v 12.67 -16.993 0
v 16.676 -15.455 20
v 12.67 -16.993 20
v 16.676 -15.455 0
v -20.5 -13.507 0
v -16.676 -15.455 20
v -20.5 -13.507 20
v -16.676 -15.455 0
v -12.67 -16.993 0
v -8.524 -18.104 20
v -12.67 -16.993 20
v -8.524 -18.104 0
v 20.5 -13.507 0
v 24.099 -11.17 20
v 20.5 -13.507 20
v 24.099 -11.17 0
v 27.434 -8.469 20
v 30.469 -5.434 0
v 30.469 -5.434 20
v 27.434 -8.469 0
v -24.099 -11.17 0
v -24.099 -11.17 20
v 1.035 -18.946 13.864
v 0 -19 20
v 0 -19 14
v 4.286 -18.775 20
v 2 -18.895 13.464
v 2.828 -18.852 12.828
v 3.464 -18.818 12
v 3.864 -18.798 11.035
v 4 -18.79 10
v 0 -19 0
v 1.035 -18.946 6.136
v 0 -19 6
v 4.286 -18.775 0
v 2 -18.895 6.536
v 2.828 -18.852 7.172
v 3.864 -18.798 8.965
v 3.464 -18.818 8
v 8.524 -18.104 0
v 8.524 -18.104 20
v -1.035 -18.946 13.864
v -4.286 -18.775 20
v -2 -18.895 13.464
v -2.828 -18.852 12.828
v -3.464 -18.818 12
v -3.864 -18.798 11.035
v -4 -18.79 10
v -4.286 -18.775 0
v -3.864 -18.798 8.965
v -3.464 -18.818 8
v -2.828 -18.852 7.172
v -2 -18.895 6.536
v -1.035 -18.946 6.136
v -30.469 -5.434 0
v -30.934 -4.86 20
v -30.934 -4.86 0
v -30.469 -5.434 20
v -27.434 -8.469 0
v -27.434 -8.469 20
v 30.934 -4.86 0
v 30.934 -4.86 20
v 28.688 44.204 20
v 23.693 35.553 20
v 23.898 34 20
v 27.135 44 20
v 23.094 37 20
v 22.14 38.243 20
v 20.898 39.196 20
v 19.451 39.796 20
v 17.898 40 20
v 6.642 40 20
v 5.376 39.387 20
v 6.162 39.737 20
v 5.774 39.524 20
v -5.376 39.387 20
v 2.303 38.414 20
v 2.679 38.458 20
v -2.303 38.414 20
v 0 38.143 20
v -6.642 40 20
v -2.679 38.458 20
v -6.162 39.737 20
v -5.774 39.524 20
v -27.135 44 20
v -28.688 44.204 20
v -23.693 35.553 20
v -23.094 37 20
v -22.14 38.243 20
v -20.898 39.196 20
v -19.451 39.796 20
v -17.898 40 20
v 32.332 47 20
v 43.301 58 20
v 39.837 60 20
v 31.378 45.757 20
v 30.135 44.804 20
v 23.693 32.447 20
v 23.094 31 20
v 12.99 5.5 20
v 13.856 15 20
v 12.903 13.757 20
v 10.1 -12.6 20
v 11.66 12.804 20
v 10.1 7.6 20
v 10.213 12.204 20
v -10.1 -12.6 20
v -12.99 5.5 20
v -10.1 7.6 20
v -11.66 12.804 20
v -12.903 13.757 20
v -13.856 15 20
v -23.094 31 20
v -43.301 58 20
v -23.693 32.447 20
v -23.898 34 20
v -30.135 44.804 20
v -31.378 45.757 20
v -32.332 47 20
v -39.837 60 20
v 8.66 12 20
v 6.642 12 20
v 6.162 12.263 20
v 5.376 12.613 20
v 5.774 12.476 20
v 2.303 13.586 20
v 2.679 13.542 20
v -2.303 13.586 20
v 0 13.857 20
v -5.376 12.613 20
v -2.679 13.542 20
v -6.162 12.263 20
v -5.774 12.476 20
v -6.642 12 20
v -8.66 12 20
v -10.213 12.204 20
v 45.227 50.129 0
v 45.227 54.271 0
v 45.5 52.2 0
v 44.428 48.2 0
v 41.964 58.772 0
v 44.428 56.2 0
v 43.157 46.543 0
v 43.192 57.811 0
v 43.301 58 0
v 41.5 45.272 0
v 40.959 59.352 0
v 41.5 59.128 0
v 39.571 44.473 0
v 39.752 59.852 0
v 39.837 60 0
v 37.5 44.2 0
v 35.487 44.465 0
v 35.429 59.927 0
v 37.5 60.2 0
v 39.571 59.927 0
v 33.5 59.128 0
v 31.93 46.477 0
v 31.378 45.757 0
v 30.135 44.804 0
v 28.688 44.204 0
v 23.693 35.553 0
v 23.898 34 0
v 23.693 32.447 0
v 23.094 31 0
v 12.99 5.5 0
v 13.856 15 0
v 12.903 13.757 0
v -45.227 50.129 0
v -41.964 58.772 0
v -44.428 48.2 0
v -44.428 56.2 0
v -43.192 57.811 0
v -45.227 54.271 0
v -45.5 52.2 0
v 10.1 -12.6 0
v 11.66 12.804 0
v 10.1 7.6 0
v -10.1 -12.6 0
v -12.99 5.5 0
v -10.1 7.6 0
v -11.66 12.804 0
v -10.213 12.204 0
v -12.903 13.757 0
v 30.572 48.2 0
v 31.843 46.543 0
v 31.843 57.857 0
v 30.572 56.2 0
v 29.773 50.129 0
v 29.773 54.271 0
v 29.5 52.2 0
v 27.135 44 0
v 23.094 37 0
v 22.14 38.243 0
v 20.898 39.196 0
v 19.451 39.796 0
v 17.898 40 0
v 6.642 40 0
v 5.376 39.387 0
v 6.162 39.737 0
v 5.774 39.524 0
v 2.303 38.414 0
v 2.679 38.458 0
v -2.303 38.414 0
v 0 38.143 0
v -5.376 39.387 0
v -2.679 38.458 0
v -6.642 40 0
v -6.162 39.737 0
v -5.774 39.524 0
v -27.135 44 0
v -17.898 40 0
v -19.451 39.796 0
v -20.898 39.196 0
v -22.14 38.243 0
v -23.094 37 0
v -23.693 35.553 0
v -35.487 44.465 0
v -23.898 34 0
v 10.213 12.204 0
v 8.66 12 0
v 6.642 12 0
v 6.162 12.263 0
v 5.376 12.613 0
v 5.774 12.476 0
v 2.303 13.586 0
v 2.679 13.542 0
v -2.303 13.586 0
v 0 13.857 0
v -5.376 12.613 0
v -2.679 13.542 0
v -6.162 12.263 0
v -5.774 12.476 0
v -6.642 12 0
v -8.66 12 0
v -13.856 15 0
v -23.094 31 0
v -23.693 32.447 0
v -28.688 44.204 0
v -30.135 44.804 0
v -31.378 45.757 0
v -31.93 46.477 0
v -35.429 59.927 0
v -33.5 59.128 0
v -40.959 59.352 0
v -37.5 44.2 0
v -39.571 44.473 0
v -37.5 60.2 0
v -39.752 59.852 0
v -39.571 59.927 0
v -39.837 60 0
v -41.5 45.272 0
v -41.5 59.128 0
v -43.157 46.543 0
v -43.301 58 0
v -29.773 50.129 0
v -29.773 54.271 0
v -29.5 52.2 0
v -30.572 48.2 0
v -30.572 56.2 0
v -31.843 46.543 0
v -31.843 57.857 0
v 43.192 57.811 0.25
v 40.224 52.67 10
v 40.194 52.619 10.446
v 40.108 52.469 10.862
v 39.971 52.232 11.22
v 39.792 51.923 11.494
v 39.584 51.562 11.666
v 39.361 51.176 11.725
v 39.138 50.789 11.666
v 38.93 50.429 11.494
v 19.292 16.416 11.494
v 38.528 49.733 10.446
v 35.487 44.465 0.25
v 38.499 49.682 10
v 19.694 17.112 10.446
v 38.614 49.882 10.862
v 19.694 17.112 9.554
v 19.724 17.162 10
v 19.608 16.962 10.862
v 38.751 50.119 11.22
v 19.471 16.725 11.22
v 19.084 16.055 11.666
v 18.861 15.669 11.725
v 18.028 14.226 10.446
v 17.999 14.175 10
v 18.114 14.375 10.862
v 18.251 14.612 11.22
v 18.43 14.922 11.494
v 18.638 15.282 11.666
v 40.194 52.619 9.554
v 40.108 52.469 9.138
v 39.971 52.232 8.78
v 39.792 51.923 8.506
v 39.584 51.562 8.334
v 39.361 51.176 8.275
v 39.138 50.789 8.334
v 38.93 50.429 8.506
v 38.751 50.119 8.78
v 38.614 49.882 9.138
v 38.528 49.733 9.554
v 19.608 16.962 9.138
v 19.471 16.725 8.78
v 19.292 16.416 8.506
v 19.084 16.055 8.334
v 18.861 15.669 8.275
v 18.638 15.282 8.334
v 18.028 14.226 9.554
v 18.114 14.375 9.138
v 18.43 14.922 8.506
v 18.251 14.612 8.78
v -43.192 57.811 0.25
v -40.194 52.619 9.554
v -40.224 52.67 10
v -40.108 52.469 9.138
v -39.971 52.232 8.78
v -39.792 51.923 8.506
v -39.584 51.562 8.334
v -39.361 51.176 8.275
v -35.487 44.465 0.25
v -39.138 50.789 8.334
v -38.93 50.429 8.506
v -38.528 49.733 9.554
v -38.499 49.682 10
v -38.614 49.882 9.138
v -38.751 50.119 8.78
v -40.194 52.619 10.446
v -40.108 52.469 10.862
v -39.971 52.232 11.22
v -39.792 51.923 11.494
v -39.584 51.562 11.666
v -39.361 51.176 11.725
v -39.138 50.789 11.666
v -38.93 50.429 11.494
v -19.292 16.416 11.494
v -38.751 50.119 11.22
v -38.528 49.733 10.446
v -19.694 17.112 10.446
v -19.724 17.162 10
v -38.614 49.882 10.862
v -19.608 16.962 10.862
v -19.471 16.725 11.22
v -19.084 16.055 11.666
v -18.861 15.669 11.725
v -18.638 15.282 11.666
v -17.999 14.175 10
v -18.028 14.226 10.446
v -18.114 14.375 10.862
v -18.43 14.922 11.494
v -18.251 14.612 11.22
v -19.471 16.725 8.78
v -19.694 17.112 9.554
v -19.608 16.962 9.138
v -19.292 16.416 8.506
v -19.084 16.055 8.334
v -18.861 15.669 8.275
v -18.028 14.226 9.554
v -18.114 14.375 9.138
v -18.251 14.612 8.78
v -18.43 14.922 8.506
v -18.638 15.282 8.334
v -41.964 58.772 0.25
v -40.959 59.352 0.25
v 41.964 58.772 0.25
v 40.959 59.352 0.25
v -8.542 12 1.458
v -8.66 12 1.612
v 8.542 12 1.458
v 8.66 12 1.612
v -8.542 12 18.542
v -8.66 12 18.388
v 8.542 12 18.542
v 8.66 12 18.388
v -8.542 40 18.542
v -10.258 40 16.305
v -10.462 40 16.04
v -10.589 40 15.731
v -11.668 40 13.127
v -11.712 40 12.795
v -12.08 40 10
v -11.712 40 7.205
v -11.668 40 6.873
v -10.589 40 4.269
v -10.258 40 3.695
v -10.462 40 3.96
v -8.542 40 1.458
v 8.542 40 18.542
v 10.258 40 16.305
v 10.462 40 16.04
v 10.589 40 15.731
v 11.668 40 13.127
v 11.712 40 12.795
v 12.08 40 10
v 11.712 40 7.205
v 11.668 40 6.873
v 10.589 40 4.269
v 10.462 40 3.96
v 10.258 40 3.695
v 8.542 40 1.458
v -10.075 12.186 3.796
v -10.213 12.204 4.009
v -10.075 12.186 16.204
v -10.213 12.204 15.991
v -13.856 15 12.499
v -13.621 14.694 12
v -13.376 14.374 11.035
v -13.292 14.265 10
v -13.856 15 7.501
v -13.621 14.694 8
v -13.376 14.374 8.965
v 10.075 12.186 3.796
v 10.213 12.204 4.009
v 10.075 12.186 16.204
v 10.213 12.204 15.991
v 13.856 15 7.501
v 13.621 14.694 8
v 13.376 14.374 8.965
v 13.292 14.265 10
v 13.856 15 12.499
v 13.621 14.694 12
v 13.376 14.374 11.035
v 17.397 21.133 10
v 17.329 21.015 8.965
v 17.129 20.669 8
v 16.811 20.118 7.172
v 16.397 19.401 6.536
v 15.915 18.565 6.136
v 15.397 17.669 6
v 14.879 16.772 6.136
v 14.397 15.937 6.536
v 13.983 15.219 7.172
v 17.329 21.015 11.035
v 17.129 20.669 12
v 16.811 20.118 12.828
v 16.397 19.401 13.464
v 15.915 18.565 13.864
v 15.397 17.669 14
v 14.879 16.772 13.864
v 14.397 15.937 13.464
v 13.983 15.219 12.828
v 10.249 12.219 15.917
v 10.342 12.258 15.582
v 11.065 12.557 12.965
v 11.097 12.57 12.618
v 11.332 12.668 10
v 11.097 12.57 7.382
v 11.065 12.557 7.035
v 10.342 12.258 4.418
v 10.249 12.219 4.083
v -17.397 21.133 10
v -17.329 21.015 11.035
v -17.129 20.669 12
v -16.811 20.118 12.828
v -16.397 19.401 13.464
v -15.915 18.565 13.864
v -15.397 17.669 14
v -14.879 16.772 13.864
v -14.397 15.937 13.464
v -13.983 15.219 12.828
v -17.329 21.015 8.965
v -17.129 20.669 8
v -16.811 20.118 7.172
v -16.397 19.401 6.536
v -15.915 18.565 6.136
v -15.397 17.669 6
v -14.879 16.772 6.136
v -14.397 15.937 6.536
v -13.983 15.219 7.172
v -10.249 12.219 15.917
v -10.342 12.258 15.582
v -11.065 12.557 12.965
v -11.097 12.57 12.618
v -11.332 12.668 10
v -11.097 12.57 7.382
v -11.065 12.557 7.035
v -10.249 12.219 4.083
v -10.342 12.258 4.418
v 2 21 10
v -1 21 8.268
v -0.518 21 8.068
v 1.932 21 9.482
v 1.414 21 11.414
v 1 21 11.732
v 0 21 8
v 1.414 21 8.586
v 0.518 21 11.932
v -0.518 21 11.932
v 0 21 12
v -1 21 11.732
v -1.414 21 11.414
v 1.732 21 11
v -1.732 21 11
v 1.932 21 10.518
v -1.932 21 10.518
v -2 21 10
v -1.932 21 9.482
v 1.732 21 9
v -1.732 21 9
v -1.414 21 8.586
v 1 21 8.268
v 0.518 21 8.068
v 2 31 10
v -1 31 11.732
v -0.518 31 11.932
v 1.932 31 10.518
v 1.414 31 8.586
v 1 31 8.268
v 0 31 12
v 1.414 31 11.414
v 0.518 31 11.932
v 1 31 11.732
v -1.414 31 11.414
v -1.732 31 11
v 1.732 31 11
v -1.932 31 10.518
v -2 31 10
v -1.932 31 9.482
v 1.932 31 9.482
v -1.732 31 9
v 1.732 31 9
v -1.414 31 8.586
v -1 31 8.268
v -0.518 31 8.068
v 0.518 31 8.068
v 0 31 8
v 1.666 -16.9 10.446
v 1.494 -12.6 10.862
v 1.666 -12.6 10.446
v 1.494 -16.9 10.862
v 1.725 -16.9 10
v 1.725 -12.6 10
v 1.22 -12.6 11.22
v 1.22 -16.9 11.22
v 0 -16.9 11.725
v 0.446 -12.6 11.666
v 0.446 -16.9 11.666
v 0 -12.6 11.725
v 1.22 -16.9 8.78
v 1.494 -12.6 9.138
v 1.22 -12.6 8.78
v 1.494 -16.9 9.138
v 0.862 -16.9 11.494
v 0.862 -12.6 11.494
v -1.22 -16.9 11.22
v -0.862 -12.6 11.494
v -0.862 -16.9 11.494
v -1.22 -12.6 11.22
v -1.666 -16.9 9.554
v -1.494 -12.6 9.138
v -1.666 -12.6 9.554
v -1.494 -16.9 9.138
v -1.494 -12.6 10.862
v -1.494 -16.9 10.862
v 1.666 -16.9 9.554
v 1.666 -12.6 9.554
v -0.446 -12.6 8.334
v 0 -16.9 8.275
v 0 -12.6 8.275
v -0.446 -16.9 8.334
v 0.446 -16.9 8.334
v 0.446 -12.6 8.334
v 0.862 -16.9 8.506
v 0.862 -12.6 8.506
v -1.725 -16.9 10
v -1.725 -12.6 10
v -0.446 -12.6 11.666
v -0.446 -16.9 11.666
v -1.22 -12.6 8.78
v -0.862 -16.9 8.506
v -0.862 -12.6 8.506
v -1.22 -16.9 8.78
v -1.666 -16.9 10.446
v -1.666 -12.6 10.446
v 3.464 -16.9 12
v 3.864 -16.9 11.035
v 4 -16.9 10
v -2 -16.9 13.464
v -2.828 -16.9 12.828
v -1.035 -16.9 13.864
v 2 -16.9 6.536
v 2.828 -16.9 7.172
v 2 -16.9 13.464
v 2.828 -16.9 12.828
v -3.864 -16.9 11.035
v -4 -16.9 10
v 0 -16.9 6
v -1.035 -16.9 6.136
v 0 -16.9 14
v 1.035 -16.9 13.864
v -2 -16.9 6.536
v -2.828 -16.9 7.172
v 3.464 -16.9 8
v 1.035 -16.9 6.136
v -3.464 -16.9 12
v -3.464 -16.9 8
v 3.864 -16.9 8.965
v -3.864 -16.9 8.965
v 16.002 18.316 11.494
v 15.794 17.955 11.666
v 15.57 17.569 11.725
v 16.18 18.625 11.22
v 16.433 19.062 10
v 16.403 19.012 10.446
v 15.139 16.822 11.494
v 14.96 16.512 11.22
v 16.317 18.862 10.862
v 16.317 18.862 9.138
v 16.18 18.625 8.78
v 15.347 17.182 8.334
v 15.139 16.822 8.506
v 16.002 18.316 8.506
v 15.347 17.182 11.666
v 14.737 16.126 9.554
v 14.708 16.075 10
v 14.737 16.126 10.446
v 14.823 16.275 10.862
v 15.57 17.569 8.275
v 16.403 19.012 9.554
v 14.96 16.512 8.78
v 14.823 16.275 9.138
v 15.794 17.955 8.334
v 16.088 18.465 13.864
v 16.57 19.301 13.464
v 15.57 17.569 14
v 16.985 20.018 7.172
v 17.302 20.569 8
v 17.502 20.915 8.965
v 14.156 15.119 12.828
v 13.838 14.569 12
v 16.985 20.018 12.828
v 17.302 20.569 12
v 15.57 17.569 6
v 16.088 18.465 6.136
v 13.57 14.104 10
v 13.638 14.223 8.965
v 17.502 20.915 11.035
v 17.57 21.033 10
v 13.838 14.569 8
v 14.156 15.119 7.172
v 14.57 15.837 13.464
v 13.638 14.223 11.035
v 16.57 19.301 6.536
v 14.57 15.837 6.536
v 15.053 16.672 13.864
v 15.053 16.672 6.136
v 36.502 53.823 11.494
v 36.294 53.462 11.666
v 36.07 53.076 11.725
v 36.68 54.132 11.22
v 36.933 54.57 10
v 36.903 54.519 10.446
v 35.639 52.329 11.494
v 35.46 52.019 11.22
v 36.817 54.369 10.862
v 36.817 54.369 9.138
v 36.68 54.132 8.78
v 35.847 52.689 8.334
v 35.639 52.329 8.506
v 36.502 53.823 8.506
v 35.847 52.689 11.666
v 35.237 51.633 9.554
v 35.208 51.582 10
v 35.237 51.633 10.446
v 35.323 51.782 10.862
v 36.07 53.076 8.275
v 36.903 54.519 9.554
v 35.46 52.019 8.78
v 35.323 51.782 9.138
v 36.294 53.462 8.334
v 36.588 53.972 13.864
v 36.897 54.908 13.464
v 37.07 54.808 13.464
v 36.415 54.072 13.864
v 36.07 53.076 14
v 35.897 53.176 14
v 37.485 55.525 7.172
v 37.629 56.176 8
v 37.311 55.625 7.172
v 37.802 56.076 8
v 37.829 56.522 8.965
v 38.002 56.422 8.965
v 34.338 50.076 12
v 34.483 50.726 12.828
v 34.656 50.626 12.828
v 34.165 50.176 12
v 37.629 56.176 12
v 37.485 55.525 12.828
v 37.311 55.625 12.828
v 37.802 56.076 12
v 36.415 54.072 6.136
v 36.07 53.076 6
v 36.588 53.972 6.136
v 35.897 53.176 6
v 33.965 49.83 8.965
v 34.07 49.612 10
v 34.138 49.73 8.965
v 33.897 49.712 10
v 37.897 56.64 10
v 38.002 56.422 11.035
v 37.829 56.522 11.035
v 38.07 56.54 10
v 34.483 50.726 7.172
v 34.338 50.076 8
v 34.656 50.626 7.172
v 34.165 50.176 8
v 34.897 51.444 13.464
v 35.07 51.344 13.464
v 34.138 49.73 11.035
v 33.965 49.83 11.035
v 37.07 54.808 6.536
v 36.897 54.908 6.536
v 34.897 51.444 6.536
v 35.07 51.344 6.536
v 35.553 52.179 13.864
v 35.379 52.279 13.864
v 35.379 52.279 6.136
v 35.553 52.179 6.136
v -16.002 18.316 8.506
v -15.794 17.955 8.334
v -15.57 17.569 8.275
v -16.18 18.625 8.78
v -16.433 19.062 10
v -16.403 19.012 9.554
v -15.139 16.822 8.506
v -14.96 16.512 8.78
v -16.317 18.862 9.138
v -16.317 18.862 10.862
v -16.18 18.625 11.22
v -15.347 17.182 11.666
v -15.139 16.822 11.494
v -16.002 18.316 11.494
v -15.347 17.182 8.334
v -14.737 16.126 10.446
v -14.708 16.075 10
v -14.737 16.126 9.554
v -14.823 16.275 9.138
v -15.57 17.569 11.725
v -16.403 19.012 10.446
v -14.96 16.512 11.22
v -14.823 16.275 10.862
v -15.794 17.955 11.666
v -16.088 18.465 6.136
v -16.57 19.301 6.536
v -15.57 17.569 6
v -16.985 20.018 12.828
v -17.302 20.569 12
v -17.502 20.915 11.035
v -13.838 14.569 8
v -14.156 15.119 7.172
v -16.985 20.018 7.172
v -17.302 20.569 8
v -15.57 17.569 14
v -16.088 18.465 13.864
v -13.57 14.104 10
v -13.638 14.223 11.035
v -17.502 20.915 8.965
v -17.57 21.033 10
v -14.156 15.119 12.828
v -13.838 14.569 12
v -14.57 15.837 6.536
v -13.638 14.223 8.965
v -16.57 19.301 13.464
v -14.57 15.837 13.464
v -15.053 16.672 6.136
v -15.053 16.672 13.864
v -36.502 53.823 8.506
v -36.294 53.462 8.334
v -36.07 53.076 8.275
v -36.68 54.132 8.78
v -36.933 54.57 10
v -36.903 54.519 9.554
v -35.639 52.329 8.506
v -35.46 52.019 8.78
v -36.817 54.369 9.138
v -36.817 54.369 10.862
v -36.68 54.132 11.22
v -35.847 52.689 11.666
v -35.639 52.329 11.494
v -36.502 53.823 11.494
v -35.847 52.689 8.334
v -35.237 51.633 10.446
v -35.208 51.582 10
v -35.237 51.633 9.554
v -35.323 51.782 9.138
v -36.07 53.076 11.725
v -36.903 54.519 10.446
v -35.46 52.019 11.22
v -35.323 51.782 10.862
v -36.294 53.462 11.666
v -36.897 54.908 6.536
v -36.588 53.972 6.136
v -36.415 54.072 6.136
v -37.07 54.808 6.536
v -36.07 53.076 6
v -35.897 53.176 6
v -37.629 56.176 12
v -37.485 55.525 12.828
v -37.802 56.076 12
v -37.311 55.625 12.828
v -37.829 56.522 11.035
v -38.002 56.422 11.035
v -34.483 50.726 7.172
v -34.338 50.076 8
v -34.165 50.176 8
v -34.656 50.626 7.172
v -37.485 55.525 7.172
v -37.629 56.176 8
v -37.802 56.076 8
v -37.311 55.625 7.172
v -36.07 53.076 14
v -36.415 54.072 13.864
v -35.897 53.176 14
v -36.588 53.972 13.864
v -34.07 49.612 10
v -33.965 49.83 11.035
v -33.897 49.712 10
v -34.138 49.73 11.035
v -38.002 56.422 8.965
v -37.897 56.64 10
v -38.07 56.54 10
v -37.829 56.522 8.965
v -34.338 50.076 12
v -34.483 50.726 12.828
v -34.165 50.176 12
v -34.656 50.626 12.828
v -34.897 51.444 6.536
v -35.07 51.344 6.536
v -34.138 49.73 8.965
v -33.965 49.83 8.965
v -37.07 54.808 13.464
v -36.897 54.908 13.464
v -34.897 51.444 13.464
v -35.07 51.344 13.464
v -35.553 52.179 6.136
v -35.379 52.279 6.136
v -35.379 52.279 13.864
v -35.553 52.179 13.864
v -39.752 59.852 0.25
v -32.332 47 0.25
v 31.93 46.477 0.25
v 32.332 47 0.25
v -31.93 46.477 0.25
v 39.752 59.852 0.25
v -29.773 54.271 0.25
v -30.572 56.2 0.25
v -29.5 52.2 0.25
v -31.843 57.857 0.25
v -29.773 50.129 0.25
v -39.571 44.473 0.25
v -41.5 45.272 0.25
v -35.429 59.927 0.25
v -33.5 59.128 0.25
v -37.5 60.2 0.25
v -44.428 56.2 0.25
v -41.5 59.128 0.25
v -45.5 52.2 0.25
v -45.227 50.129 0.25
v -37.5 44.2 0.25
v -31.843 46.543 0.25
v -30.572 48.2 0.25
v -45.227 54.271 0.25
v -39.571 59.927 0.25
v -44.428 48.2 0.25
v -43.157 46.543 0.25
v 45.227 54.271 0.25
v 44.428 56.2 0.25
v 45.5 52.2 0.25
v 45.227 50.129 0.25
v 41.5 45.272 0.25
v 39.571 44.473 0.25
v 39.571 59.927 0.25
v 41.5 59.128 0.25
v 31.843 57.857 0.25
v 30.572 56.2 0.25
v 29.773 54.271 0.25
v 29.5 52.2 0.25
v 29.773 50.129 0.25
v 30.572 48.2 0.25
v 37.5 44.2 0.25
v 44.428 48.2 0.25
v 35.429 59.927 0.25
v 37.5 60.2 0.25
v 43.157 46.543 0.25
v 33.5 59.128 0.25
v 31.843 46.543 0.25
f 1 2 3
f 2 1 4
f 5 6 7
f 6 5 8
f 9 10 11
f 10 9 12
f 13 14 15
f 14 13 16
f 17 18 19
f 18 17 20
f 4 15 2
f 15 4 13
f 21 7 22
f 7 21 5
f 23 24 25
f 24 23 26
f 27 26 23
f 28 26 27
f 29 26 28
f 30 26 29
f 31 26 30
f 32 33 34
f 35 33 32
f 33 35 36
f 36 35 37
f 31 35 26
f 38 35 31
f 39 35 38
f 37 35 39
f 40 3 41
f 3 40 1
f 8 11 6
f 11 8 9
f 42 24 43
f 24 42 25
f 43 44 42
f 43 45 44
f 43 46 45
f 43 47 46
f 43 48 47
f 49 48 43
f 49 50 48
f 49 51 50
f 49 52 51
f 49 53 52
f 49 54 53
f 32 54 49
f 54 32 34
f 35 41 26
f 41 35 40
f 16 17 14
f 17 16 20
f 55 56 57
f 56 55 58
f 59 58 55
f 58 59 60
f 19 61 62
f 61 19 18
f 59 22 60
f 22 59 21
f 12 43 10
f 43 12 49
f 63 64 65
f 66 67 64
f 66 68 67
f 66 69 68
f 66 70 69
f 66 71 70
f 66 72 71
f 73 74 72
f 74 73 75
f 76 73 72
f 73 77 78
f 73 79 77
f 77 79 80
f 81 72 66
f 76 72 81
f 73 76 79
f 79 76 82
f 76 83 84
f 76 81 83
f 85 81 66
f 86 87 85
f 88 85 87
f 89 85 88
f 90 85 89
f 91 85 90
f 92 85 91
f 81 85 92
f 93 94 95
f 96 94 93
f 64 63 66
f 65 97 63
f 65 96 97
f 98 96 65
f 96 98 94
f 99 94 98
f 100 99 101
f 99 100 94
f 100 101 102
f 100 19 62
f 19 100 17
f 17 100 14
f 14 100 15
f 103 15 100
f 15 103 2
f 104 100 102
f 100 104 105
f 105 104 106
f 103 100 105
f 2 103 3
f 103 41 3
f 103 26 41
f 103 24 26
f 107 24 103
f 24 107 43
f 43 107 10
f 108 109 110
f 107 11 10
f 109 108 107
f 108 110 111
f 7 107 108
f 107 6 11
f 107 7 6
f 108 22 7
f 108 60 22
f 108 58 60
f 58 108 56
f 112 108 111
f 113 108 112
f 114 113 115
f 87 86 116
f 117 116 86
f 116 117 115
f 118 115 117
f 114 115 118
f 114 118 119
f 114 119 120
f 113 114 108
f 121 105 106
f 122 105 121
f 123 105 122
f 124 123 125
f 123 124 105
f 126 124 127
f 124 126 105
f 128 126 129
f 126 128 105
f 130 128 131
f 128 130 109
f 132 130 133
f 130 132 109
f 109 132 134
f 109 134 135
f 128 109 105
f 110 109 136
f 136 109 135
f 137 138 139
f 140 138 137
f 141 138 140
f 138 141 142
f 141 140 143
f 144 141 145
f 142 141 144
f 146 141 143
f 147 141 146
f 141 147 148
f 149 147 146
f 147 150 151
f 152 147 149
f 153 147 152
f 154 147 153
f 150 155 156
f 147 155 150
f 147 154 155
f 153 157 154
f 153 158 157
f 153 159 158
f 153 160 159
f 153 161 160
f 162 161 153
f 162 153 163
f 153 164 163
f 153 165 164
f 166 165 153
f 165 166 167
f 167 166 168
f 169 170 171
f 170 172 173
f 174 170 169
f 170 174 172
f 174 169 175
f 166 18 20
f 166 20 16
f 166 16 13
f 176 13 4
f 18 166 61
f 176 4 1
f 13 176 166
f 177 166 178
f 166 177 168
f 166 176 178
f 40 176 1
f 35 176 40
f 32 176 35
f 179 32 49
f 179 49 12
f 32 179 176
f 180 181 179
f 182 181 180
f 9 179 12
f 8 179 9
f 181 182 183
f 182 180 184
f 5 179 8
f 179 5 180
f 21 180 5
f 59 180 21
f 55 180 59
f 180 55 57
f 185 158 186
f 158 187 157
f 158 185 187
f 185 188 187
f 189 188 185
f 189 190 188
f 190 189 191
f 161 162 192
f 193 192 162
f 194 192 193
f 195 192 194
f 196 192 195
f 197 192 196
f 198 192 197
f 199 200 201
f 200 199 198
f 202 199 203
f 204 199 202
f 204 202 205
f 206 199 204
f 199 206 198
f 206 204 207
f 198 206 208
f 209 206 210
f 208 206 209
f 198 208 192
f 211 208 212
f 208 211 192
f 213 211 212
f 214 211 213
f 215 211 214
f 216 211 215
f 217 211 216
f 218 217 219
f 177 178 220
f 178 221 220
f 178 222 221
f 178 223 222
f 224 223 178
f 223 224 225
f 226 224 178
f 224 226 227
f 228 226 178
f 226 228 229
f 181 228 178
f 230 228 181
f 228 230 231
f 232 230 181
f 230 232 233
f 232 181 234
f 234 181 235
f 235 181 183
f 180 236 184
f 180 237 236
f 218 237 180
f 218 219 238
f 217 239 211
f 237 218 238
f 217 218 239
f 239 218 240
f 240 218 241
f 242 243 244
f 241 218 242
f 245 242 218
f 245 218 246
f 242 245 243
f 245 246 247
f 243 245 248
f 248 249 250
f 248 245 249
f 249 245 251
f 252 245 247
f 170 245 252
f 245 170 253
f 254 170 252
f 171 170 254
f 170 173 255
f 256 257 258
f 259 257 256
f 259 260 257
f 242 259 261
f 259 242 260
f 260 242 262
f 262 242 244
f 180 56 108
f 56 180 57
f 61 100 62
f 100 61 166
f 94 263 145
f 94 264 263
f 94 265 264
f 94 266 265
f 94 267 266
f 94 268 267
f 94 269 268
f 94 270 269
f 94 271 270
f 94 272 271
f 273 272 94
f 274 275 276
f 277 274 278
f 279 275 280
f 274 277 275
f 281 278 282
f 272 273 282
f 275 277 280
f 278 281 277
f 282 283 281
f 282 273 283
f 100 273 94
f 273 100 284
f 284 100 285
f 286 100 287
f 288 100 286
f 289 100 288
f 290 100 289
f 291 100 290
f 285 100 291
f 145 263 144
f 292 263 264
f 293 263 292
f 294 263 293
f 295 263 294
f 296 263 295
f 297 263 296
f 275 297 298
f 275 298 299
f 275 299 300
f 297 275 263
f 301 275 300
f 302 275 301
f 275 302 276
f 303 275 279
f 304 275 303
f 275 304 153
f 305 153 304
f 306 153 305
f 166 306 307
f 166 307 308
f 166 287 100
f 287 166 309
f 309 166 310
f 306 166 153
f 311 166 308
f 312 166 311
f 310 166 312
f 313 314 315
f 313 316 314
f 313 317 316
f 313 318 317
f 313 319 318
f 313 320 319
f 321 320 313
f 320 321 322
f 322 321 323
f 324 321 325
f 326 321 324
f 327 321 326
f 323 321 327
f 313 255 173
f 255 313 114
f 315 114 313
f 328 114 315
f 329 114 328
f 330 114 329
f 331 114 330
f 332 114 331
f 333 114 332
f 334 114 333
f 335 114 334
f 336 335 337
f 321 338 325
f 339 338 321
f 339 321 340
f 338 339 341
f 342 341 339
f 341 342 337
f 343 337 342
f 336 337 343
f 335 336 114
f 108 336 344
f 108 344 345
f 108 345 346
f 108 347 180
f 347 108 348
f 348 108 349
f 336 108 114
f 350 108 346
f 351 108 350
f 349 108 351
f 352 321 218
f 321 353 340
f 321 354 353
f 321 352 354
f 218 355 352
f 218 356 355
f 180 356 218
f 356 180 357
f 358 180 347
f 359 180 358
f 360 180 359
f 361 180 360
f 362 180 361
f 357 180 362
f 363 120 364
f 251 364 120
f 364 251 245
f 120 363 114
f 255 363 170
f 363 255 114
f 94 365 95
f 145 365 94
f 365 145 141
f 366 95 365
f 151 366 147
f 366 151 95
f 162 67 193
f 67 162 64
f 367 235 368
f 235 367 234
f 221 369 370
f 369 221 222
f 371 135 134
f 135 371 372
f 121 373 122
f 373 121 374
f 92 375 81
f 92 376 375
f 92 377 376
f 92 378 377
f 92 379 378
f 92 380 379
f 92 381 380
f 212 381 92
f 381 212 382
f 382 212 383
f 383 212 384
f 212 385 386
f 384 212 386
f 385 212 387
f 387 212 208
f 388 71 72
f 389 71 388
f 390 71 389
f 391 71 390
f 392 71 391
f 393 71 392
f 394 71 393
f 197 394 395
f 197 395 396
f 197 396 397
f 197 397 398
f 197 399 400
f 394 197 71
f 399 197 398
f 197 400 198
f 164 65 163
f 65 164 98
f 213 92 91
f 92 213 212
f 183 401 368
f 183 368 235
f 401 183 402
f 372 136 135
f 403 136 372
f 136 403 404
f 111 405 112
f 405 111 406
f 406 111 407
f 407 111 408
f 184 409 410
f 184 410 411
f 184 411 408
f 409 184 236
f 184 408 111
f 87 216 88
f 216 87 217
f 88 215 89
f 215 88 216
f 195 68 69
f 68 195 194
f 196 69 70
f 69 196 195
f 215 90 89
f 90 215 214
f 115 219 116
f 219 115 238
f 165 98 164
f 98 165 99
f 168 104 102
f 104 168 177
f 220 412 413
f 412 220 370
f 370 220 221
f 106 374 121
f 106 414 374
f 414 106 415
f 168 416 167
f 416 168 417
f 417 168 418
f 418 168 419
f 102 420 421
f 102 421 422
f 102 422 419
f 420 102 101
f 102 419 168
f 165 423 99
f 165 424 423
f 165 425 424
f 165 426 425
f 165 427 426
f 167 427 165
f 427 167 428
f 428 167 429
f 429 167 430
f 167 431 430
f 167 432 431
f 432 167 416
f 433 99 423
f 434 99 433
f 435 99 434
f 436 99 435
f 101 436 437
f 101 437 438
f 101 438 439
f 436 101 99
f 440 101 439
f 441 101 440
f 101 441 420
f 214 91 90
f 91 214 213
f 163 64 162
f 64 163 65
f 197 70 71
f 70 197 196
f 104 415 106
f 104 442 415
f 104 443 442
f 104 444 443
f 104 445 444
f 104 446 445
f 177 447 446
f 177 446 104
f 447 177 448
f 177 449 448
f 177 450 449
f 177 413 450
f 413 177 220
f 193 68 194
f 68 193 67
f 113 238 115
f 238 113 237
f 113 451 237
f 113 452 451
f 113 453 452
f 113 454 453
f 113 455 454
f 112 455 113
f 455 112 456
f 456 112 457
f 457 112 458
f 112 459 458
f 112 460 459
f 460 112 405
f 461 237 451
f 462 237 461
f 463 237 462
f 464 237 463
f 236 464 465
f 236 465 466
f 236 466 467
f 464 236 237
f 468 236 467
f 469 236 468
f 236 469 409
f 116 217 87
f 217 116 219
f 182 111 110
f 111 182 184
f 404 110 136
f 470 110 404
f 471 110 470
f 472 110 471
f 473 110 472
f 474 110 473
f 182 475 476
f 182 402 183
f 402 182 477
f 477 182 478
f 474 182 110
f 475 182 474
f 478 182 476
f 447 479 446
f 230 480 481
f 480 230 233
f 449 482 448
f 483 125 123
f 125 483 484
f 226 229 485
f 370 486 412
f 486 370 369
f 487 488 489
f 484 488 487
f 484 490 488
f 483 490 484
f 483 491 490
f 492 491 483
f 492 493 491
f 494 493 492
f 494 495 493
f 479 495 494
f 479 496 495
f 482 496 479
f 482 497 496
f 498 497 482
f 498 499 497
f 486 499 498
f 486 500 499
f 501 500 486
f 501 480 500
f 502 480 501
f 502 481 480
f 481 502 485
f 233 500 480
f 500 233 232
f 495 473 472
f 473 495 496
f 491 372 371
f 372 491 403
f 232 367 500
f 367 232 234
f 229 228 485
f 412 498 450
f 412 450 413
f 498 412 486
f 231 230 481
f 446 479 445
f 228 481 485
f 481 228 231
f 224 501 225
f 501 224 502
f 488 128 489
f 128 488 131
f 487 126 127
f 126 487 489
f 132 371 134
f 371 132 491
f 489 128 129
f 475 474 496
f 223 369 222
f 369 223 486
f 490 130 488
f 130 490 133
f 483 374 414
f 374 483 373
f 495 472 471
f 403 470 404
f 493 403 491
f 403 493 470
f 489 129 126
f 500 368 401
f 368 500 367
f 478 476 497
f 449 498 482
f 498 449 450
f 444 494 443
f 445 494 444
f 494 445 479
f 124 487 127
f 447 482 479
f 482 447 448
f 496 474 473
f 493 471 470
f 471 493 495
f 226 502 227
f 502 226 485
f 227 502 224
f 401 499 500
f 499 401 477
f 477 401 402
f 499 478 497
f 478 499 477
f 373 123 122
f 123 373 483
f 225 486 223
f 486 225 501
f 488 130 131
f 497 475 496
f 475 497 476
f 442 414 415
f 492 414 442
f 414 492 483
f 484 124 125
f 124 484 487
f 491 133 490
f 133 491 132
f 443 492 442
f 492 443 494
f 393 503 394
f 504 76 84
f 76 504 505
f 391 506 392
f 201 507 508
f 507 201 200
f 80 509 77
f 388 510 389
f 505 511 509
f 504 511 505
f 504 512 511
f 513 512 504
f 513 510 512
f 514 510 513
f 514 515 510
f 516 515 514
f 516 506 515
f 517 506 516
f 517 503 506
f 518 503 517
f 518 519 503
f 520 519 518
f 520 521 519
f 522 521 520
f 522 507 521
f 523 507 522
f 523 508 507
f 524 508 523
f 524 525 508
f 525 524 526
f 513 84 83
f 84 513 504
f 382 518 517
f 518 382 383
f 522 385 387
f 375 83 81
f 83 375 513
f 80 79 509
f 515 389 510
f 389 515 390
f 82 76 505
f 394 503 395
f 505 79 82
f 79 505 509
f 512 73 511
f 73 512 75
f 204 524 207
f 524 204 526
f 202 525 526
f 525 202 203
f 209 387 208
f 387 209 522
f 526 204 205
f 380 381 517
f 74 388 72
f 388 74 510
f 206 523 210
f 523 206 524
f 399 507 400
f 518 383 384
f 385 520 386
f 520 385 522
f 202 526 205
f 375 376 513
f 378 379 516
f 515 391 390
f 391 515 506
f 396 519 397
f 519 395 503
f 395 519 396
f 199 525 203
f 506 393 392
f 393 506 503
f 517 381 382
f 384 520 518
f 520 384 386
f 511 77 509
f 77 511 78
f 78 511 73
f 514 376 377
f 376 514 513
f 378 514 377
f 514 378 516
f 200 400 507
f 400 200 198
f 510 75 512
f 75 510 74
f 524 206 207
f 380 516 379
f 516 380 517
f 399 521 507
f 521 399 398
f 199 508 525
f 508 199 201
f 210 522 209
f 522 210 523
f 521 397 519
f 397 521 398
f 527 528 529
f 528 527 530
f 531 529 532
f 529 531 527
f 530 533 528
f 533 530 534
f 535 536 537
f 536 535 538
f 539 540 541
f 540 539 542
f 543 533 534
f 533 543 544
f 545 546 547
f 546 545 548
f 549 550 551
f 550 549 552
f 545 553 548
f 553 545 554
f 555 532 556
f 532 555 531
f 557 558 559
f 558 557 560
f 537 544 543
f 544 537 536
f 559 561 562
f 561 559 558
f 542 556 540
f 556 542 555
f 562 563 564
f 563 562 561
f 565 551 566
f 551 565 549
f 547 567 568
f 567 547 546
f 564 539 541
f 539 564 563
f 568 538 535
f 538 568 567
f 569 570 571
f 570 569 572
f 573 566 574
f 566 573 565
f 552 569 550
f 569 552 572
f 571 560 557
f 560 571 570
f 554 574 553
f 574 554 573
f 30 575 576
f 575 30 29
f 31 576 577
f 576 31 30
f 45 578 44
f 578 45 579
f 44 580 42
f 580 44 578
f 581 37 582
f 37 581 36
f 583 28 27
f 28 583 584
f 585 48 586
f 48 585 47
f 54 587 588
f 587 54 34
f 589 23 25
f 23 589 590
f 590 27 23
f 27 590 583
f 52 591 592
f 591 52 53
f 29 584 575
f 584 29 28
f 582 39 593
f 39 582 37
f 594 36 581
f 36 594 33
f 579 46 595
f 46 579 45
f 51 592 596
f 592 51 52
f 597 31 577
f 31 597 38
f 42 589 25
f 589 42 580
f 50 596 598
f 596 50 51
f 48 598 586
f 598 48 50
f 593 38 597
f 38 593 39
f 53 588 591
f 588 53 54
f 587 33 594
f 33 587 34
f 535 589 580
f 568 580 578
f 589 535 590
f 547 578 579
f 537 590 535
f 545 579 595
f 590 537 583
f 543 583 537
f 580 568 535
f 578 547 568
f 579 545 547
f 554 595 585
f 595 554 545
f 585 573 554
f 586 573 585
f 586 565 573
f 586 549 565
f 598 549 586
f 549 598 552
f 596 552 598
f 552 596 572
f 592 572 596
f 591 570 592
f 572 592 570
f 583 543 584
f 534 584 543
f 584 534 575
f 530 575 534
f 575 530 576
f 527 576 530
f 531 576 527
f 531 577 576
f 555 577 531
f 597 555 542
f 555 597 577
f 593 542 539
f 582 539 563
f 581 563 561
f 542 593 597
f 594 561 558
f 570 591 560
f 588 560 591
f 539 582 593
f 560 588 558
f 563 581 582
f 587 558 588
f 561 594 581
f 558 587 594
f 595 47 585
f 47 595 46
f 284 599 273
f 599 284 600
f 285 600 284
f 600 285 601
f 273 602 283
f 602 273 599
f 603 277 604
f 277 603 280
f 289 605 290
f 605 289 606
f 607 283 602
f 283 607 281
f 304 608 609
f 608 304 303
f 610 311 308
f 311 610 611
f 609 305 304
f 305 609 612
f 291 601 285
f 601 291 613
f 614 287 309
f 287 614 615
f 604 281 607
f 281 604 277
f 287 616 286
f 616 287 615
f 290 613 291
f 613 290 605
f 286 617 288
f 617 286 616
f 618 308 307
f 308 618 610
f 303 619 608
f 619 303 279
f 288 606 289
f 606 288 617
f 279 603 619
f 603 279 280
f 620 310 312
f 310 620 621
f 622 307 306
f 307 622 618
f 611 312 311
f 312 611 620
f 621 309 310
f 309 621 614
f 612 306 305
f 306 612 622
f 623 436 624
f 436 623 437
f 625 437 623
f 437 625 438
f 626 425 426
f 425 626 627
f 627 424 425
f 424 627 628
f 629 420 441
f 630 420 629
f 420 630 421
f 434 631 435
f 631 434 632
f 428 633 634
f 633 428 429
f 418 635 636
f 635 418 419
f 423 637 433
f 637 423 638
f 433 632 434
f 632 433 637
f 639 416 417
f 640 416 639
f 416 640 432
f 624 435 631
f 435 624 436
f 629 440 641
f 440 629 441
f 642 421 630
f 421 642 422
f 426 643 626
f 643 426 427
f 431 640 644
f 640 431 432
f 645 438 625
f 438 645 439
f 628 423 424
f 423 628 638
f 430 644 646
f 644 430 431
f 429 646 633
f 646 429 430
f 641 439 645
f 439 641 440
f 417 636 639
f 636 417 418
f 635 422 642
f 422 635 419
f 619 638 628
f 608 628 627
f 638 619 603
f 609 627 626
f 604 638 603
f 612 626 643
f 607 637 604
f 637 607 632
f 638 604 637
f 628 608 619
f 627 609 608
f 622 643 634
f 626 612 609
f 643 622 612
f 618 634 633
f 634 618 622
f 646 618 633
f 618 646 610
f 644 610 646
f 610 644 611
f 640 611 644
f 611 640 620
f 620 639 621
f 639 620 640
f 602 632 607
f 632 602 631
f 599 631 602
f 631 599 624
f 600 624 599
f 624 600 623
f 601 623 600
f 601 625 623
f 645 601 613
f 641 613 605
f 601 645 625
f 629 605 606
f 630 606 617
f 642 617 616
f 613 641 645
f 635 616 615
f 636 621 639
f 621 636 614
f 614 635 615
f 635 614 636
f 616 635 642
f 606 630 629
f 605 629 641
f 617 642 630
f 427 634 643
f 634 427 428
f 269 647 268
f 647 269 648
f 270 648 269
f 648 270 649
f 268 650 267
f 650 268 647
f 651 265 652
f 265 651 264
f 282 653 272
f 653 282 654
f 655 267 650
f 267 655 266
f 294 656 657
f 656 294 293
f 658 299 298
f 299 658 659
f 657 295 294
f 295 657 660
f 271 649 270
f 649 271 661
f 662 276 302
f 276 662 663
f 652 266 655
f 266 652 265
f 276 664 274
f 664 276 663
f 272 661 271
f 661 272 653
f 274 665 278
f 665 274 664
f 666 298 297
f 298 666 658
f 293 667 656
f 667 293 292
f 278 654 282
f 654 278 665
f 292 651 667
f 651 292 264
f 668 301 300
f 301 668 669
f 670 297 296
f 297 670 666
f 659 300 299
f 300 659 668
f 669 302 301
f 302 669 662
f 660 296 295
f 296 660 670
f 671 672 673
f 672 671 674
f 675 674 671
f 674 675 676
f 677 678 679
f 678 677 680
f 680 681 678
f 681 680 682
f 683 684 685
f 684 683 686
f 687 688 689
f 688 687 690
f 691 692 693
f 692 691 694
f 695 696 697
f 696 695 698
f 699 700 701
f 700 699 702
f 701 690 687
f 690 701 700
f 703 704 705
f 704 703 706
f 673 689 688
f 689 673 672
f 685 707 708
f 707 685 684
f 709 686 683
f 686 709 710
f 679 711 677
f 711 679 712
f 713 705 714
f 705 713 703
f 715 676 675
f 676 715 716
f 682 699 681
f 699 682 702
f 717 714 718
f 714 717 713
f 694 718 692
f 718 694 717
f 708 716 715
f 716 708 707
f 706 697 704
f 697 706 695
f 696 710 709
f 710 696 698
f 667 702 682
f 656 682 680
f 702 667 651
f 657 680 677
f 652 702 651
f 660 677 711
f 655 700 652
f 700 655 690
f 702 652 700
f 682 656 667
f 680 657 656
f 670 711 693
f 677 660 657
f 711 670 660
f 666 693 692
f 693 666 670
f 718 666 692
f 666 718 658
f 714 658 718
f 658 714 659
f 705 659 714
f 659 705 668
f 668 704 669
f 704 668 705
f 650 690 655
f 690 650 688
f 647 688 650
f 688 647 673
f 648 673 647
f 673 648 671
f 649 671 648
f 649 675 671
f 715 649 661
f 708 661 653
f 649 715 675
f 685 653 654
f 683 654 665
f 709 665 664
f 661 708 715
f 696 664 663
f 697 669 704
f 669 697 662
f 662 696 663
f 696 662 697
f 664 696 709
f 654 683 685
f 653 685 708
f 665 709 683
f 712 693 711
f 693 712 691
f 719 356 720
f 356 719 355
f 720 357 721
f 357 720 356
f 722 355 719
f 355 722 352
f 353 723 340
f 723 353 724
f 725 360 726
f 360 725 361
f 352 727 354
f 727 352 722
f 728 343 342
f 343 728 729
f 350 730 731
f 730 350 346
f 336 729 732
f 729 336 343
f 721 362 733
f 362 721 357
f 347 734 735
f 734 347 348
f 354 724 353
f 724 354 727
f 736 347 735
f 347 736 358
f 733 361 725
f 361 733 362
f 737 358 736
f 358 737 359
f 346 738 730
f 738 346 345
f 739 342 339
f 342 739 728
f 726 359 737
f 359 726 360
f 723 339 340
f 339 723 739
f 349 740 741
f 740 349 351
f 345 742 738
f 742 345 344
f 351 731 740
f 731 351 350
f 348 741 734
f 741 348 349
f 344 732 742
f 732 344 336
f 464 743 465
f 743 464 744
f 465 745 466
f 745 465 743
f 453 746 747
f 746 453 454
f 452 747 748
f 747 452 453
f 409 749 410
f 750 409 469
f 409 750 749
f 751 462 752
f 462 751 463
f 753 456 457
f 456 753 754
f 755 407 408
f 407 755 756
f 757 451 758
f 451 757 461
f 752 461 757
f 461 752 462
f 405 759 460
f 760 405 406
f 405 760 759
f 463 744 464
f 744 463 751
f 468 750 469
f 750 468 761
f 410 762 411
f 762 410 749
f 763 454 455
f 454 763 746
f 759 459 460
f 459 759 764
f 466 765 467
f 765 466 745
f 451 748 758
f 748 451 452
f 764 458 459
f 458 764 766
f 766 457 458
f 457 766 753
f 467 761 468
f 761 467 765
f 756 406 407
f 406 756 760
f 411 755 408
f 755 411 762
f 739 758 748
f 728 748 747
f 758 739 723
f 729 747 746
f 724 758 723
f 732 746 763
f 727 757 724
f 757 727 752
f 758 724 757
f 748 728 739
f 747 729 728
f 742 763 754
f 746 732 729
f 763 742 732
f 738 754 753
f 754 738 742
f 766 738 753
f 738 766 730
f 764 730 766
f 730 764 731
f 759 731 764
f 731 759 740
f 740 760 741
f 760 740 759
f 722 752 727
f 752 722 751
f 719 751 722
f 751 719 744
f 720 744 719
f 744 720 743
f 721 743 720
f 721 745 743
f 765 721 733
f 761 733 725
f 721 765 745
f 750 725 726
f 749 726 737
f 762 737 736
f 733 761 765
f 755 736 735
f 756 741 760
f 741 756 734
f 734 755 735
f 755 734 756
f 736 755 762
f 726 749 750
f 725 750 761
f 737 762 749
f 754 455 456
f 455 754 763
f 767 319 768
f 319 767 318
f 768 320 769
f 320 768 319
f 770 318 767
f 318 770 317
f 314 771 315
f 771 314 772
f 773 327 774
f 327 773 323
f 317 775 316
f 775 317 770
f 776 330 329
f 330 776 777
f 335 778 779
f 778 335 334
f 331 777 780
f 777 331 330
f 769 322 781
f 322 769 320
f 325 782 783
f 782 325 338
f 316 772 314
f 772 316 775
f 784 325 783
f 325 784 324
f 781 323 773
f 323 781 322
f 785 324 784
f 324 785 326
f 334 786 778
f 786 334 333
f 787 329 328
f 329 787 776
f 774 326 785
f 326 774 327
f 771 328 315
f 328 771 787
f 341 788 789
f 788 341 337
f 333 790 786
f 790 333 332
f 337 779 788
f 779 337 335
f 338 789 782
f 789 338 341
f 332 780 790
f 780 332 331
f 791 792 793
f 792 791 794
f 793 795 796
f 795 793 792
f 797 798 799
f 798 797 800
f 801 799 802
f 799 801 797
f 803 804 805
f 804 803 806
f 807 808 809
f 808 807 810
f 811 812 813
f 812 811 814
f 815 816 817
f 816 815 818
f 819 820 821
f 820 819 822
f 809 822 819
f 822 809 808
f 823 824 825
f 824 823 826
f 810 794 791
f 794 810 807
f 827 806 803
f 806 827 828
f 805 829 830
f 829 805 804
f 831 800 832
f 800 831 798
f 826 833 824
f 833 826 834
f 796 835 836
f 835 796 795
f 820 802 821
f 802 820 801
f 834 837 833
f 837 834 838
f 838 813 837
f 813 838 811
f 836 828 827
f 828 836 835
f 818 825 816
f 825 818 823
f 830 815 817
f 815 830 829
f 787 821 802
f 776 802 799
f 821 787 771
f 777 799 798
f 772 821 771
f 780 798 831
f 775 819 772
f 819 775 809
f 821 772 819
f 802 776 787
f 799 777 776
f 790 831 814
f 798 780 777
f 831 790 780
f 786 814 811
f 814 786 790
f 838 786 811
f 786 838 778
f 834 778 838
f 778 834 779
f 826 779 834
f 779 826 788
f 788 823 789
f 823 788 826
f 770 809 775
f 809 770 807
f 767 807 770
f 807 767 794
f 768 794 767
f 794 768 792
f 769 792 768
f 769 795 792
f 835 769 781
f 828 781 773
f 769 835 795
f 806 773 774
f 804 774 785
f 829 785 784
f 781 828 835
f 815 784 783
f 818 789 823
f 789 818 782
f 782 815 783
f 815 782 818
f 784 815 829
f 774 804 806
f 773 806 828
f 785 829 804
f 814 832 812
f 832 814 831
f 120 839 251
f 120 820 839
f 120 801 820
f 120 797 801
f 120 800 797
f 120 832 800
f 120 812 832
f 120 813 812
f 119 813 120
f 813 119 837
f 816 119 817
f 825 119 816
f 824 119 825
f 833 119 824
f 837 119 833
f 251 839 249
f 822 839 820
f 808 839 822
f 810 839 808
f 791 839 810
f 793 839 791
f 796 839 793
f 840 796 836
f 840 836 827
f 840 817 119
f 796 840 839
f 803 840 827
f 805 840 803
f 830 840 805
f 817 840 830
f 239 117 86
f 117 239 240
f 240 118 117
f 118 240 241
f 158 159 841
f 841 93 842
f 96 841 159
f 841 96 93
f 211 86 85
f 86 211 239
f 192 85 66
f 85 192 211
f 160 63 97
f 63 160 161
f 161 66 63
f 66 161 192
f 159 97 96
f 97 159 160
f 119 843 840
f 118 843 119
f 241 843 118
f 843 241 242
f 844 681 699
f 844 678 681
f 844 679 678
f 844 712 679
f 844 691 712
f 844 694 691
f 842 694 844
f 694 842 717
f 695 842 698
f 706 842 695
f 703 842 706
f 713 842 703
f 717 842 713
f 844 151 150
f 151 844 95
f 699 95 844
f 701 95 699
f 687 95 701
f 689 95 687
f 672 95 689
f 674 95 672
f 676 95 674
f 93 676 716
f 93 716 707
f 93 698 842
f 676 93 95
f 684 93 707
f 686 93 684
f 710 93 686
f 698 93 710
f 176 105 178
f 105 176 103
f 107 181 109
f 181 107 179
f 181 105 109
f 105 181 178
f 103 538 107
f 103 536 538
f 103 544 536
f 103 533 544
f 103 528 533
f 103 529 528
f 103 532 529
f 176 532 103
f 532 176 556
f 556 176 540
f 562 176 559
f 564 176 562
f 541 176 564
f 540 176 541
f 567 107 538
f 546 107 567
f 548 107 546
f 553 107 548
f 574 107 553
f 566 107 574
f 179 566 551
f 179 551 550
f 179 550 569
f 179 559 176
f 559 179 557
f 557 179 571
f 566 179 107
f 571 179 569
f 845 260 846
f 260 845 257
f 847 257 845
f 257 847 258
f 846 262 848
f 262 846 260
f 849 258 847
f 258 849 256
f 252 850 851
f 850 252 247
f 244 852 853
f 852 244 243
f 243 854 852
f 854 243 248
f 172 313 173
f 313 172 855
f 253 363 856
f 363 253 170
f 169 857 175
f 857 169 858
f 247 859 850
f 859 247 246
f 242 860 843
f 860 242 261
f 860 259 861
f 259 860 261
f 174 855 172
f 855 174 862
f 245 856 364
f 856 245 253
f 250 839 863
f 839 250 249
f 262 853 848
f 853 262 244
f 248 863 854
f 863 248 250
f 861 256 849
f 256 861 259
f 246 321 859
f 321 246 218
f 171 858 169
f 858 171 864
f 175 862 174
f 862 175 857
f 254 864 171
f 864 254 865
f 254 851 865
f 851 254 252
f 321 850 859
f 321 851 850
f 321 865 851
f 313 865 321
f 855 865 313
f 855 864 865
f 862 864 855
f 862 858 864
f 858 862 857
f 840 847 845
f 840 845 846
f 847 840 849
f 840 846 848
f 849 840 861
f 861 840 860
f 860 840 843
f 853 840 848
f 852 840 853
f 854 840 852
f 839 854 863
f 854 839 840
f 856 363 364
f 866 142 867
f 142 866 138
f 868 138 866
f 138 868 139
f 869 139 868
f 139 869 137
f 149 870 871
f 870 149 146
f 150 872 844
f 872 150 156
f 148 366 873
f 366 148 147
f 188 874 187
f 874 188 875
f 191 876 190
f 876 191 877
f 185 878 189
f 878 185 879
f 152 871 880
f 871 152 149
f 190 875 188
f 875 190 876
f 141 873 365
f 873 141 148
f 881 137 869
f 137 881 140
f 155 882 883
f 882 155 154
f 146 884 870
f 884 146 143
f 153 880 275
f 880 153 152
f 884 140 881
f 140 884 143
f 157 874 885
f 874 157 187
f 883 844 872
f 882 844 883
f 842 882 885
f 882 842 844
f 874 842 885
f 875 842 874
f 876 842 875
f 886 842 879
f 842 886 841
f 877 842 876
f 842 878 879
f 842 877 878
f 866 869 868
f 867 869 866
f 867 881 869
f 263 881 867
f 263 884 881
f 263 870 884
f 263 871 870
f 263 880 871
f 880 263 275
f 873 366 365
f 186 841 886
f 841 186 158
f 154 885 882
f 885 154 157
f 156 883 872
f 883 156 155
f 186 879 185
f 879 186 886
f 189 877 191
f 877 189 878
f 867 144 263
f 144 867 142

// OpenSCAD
// file: configuration2020.scad
// Increase this if your slicer or printer make holes too tight.
extra_radius = 0.1;

// OD = outside diameter, corner to corner.
m3_nut_od = 6.1;
m3_nut_radius = m3_nut_od/2 + 0.2 + extra_radius;
m3_washer_radius = 3.5 + extra_radius;

// Major diameter of metric 3mm thread.
m3_major = 2.85;
m3_radius = m3_major/2 + extra_radius;
m3_wide_radius = m3_major/2 + extra_radius + 0.2;

// Major diameter of metric 3mm thread.
m4_major = 3.85;
m4_radius = m4_major/2 + extra_radius;
m4_wide_radius = m4_major/2 + extra_radius + 0.2;

// NEMA17 stepper motors.
motor_shaft_diameter = 5;
motor_shaft_radius = motor_shaft_diameter/2 + extra_radius;

// Frame brackets. M3x8mm screws work best with 3.6 mm brackets.
thickness = 3.6;

// OpenBeam or Misumi. Currently only 15x15 mm, but there is a plan
// to make models more parametric and allow 20x20 mm in the future.
extrusion = 20;

// Placement for the NEMA17 stepper motors.
motor_offset = 44;
motor_length = 47;
// main file
include <configuration2020.scad>;

$fn = 24;
roundness = 6;

module extrusion_cutout(h, extra) {

  difference() {
//1515 #    cube([15, 15, h], center=true);
 translate([0,-2.5,0])  cube([extrusion+extra, extrusion+extra, h], center=true);
/* slot
    for (a = [0:90:359]) rotate([0, 0, a]) {
      translate([extrusion/2, 0, 0])
        cube([6, 2.5, h+1], center=true);
    }
*/
  }
}

module screw_socket() {
  cylinder(r=m3_wide_radius, h=20, center=true);
  translate([0, 0, 3.8]) cylinder(r=4, h=5);
}

module screw_socket_cone() {
  union() {
    screw_socket();
    scale([1, 1, -1]) cylinder(r1=4, r2=7, h=4);
  }
}

module vertex(height, idler_offset, idler_space) {
  union() {
    // Pads to improve print bed adhesion for slim ends.
    translate([-37.5, 52.2, -height/2]) cylinder(r=8, h=0.25);
    translate([37.5, 52.2, -height/2]) cylinder(r=8, h=0.25);

    difference() {
      union() {
        intersection() {
          translate([0, 22, 0])
          	cylinder(r=41, h=height, center=true, $fn=60);
          translate([0, -37, 0]) rotate([0, 0, 30])
            cylinder(r=50, h=height+1, center=true, $fn=6);
        }
        translate([0, 38, 0]) intersection() {
			rotate([0, 0, -90]) cylinder(r=55, h=height, center=true, $fn=3);
          translate([0, 10, 0]) cube([100, 100, 2*height], center=true);
          translate([0, -10, 0]) rotate([0, 0, 30])
            cylinder(r=55, h=height+1, center=true, $fn=6);
        }
          
      }
     difference() {
			color("blue") translate([0, 58, 0]) minkowski() {
          intersection() {
            rotate([0, 0, -90])
              cylinder(r=55, h=height, center=true, $fn=3);
            translate([0, -32, 0])
              cube([100, 16, 2*height], center=true);
          }
          cylinder(r=roundness, h=1, center=true);
        }
        // Idler support cones.
        translate([0, 26+idler_offset-30, 0]) rotate([-90, 0, 0])
          cylinder(r1=30, r2=2, h=30-idler_space/2);
        translate([0, 26+idler_offset+30, 0]) rotate([90, 0, 0])
          cylinder(r1=30, r2=2, h=30-idler_space/2);
      }
      color ("red") translate([0, 58, 0]) minkowski() {
        intersection() {
          rotate([0, 0, -90])
            cylinder(r=55, h=height, center=true, $fn=3);
          translate([0, 7, 0])
            cube([100, 30, 2*height], center=true);
        }
        cylinder(r=roundness, h=1, center=true);
      }

      extrusion_cutout(height+10, 2*extra_radius);


      for (z = [0:25:height]) {

        translate([0, -13-extra_radius, z+10-height/2]) rotate([90, 0, 0])screw_socket();

	        for (a = [-1, 1]) {

	          rotate([0, 0, 30*a]) translate([-18.5*a, 111, z+10-height/2]) {
	            for (y = [-88, -47]) {
#	              translate([a*10, y, 0]) rotate([0, a*90, 0]) screw_socket();
	            }
	            // Nut tunnels.
					/*
					for (z = [-1, 1]) {
						scale([1, 1, z]) translate([0, -100,6]) minkowski() {
							rotate([0, 0, -a*30]) cylinder(r=5, h=12, $fn=6);
							cube([0.1, 5, 0.1], center=true);
				      }
					}
					*/

          }

        }
      }
    }
  }
}


translate([0, 0, 10]) vertex(20, idler_offset=0, idler_space=10);
